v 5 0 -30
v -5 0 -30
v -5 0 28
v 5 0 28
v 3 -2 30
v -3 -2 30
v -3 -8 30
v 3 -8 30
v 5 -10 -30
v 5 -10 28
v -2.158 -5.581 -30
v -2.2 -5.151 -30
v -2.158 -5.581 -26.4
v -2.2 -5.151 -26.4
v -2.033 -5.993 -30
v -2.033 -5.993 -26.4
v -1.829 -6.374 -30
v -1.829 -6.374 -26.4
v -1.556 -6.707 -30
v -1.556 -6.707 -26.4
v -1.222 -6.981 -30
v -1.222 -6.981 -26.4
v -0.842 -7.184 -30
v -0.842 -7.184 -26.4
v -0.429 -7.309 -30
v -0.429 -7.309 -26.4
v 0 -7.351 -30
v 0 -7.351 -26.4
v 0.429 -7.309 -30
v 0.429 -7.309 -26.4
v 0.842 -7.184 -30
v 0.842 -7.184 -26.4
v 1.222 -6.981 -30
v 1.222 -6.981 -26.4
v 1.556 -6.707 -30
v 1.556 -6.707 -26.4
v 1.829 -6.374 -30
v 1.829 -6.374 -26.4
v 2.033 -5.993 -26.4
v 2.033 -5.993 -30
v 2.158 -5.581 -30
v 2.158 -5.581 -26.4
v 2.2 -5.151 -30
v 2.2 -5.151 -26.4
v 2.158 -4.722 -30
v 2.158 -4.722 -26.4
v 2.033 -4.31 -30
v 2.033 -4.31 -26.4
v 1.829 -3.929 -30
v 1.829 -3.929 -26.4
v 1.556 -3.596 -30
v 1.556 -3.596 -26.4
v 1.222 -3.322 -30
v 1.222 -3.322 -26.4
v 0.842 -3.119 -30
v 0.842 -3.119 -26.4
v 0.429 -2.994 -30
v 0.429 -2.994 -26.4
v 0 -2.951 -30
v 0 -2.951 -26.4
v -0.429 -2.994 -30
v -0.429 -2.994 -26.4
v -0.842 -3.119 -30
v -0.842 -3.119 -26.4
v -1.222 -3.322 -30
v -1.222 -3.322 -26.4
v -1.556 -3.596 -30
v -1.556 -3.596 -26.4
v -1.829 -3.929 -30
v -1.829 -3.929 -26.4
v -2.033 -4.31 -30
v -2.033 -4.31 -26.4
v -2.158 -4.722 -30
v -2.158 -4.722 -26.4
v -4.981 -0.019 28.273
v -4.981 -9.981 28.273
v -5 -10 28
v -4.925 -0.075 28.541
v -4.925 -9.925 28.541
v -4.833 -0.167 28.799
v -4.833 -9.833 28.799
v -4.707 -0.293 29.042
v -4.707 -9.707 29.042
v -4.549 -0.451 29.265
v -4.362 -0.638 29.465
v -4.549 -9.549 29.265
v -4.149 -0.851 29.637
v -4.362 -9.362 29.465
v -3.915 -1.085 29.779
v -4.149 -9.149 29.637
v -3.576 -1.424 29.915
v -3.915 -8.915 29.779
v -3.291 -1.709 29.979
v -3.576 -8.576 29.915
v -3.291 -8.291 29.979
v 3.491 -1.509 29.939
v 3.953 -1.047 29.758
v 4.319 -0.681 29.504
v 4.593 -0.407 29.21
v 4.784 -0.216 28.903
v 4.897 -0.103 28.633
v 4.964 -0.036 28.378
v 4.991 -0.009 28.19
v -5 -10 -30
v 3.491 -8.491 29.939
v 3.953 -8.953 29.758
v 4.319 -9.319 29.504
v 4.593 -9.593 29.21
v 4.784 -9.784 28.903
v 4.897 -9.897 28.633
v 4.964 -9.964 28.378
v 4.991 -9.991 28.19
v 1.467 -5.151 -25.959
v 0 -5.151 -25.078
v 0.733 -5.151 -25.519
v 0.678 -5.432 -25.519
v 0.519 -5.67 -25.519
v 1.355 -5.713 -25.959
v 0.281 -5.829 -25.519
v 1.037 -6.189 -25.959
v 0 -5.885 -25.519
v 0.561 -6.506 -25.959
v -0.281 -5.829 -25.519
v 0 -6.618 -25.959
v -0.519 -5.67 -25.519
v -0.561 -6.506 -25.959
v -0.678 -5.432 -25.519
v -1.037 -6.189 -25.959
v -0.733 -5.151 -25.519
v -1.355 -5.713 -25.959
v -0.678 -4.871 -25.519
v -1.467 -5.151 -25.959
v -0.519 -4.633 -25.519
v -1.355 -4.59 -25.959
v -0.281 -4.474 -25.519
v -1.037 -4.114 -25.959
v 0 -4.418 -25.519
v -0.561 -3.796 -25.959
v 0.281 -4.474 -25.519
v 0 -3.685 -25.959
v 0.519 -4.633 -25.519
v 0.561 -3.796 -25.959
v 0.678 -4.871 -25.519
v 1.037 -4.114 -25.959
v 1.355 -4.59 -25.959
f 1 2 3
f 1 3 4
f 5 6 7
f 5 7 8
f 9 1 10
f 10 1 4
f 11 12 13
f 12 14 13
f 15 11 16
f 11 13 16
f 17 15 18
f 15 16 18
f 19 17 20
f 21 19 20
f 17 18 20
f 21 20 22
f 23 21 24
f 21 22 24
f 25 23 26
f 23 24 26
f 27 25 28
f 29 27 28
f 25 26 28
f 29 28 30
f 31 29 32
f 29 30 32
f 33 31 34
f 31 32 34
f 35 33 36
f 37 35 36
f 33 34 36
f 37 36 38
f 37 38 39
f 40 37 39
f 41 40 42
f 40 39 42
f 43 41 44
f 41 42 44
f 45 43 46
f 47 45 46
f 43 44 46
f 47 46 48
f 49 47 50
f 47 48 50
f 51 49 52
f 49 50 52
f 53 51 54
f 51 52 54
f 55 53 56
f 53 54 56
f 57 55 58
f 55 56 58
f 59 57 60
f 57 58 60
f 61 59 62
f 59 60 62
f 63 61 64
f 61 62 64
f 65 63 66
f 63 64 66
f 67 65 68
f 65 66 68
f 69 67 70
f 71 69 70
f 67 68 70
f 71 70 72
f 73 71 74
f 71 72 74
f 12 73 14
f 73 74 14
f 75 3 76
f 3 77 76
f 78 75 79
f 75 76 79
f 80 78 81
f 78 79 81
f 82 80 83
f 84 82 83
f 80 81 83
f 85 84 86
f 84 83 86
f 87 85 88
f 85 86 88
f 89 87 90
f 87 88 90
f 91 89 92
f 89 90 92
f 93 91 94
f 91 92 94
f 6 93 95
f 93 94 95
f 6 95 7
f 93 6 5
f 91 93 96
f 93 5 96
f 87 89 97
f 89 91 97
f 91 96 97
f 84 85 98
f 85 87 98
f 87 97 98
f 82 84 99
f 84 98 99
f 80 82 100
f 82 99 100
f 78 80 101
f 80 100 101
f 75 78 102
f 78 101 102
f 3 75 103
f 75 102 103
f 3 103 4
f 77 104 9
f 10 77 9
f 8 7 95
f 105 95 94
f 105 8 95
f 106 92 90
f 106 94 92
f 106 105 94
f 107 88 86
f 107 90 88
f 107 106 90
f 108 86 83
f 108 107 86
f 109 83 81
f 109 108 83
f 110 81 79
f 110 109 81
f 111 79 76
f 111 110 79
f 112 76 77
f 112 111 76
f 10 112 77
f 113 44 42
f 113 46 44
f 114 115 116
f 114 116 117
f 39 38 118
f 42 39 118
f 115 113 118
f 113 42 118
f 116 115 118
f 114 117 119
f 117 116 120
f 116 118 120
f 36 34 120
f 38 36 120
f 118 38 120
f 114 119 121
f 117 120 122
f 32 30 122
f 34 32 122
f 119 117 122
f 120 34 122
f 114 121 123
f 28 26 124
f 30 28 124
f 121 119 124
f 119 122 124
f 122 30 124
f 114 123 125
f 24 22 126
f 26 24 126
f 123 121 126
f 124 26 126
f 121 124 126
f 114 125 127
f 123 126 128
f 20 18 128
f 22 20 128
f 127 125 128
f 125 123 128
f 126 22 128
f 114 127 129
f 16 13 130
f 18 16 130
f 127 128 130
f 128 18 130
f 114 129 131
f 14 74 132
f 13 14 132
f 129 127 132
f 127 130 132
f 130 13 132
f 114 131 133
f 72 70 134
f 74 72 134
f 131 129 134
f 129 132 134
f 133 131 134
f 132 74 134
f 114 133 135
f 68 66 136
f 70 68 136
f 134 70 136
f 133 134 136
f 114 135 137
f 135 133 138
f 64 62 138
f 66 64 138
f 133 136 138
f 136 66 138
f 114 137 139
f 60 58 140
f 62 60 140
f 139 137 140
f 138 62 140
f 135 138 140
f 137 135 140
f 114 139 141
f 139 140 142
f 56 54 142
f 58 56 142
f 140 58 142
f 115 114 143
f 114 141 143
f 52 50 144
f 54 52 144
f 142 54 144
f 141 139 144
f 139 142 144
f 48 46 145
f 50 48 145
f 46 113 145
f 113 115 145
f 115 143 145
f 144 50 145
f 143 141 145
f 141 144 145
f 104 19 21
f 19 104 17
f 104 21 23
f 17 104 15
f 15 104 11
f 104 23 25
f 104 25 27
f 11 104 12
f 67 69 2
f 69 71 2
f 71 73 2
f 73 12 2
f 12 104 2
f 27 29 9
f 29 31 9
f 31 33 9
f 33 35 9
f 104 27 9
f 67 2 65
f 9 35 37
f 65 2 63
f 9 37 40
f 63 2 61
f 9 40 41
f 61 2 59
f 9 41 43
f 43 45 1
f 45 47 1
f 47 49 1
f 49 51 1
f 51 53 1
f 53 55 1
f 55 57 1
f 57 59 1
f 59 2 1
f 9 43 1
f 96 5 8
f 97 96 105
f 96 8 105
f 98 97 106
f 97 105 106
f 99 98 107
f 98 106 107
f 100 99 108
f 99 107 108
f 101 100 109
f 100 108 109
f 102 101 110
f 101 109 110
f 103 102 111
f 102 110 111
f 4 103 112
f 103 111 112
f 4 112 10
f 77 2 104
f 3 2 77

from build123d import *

# Parameters (mm, degrees)
F0_W     = 10
F0_H     = 60
F1_DEPTH = 10
F3_D     = 4.4
F3_DEPTH = 3.6
F3_TIP   = 1.3218933619
F4_R     = 2


with BuildPart() as f1:
    # F0 (on Front) → F1 (new body)
    with BuildSketch(Plane.XZ):
        Rectangle(F0_W, F0_H)
    extrude(amount=F1_DEPTH)

    # F3
    with Locations(Plane(origin=(0, 0, -30), x_dir=(1, 0, 0), z_dir=(0, 0, -1))):
        with Locations((0, 5.1514371298)):
            Hole(F3_D / 2, depth=F3_DEPTH)
            with Locations((0, 0, -(F3_DEPTH + F3_TIP / 2))):  # 118° drill point
                Cone(0, F3_D / 2, F3_TIP, mode=Mode.SUBTRACT)

    # F4
    f4_edges = [f1.edges().sort_by_distance(p)[0] for p in [
        (5, -5, 30),
        (-5, -5, 30),
        (0, 0, 30),
        (0, -10, 30),
    ]]
    fillet(f4_edges, radius=F4_R)


solid = f1.part
